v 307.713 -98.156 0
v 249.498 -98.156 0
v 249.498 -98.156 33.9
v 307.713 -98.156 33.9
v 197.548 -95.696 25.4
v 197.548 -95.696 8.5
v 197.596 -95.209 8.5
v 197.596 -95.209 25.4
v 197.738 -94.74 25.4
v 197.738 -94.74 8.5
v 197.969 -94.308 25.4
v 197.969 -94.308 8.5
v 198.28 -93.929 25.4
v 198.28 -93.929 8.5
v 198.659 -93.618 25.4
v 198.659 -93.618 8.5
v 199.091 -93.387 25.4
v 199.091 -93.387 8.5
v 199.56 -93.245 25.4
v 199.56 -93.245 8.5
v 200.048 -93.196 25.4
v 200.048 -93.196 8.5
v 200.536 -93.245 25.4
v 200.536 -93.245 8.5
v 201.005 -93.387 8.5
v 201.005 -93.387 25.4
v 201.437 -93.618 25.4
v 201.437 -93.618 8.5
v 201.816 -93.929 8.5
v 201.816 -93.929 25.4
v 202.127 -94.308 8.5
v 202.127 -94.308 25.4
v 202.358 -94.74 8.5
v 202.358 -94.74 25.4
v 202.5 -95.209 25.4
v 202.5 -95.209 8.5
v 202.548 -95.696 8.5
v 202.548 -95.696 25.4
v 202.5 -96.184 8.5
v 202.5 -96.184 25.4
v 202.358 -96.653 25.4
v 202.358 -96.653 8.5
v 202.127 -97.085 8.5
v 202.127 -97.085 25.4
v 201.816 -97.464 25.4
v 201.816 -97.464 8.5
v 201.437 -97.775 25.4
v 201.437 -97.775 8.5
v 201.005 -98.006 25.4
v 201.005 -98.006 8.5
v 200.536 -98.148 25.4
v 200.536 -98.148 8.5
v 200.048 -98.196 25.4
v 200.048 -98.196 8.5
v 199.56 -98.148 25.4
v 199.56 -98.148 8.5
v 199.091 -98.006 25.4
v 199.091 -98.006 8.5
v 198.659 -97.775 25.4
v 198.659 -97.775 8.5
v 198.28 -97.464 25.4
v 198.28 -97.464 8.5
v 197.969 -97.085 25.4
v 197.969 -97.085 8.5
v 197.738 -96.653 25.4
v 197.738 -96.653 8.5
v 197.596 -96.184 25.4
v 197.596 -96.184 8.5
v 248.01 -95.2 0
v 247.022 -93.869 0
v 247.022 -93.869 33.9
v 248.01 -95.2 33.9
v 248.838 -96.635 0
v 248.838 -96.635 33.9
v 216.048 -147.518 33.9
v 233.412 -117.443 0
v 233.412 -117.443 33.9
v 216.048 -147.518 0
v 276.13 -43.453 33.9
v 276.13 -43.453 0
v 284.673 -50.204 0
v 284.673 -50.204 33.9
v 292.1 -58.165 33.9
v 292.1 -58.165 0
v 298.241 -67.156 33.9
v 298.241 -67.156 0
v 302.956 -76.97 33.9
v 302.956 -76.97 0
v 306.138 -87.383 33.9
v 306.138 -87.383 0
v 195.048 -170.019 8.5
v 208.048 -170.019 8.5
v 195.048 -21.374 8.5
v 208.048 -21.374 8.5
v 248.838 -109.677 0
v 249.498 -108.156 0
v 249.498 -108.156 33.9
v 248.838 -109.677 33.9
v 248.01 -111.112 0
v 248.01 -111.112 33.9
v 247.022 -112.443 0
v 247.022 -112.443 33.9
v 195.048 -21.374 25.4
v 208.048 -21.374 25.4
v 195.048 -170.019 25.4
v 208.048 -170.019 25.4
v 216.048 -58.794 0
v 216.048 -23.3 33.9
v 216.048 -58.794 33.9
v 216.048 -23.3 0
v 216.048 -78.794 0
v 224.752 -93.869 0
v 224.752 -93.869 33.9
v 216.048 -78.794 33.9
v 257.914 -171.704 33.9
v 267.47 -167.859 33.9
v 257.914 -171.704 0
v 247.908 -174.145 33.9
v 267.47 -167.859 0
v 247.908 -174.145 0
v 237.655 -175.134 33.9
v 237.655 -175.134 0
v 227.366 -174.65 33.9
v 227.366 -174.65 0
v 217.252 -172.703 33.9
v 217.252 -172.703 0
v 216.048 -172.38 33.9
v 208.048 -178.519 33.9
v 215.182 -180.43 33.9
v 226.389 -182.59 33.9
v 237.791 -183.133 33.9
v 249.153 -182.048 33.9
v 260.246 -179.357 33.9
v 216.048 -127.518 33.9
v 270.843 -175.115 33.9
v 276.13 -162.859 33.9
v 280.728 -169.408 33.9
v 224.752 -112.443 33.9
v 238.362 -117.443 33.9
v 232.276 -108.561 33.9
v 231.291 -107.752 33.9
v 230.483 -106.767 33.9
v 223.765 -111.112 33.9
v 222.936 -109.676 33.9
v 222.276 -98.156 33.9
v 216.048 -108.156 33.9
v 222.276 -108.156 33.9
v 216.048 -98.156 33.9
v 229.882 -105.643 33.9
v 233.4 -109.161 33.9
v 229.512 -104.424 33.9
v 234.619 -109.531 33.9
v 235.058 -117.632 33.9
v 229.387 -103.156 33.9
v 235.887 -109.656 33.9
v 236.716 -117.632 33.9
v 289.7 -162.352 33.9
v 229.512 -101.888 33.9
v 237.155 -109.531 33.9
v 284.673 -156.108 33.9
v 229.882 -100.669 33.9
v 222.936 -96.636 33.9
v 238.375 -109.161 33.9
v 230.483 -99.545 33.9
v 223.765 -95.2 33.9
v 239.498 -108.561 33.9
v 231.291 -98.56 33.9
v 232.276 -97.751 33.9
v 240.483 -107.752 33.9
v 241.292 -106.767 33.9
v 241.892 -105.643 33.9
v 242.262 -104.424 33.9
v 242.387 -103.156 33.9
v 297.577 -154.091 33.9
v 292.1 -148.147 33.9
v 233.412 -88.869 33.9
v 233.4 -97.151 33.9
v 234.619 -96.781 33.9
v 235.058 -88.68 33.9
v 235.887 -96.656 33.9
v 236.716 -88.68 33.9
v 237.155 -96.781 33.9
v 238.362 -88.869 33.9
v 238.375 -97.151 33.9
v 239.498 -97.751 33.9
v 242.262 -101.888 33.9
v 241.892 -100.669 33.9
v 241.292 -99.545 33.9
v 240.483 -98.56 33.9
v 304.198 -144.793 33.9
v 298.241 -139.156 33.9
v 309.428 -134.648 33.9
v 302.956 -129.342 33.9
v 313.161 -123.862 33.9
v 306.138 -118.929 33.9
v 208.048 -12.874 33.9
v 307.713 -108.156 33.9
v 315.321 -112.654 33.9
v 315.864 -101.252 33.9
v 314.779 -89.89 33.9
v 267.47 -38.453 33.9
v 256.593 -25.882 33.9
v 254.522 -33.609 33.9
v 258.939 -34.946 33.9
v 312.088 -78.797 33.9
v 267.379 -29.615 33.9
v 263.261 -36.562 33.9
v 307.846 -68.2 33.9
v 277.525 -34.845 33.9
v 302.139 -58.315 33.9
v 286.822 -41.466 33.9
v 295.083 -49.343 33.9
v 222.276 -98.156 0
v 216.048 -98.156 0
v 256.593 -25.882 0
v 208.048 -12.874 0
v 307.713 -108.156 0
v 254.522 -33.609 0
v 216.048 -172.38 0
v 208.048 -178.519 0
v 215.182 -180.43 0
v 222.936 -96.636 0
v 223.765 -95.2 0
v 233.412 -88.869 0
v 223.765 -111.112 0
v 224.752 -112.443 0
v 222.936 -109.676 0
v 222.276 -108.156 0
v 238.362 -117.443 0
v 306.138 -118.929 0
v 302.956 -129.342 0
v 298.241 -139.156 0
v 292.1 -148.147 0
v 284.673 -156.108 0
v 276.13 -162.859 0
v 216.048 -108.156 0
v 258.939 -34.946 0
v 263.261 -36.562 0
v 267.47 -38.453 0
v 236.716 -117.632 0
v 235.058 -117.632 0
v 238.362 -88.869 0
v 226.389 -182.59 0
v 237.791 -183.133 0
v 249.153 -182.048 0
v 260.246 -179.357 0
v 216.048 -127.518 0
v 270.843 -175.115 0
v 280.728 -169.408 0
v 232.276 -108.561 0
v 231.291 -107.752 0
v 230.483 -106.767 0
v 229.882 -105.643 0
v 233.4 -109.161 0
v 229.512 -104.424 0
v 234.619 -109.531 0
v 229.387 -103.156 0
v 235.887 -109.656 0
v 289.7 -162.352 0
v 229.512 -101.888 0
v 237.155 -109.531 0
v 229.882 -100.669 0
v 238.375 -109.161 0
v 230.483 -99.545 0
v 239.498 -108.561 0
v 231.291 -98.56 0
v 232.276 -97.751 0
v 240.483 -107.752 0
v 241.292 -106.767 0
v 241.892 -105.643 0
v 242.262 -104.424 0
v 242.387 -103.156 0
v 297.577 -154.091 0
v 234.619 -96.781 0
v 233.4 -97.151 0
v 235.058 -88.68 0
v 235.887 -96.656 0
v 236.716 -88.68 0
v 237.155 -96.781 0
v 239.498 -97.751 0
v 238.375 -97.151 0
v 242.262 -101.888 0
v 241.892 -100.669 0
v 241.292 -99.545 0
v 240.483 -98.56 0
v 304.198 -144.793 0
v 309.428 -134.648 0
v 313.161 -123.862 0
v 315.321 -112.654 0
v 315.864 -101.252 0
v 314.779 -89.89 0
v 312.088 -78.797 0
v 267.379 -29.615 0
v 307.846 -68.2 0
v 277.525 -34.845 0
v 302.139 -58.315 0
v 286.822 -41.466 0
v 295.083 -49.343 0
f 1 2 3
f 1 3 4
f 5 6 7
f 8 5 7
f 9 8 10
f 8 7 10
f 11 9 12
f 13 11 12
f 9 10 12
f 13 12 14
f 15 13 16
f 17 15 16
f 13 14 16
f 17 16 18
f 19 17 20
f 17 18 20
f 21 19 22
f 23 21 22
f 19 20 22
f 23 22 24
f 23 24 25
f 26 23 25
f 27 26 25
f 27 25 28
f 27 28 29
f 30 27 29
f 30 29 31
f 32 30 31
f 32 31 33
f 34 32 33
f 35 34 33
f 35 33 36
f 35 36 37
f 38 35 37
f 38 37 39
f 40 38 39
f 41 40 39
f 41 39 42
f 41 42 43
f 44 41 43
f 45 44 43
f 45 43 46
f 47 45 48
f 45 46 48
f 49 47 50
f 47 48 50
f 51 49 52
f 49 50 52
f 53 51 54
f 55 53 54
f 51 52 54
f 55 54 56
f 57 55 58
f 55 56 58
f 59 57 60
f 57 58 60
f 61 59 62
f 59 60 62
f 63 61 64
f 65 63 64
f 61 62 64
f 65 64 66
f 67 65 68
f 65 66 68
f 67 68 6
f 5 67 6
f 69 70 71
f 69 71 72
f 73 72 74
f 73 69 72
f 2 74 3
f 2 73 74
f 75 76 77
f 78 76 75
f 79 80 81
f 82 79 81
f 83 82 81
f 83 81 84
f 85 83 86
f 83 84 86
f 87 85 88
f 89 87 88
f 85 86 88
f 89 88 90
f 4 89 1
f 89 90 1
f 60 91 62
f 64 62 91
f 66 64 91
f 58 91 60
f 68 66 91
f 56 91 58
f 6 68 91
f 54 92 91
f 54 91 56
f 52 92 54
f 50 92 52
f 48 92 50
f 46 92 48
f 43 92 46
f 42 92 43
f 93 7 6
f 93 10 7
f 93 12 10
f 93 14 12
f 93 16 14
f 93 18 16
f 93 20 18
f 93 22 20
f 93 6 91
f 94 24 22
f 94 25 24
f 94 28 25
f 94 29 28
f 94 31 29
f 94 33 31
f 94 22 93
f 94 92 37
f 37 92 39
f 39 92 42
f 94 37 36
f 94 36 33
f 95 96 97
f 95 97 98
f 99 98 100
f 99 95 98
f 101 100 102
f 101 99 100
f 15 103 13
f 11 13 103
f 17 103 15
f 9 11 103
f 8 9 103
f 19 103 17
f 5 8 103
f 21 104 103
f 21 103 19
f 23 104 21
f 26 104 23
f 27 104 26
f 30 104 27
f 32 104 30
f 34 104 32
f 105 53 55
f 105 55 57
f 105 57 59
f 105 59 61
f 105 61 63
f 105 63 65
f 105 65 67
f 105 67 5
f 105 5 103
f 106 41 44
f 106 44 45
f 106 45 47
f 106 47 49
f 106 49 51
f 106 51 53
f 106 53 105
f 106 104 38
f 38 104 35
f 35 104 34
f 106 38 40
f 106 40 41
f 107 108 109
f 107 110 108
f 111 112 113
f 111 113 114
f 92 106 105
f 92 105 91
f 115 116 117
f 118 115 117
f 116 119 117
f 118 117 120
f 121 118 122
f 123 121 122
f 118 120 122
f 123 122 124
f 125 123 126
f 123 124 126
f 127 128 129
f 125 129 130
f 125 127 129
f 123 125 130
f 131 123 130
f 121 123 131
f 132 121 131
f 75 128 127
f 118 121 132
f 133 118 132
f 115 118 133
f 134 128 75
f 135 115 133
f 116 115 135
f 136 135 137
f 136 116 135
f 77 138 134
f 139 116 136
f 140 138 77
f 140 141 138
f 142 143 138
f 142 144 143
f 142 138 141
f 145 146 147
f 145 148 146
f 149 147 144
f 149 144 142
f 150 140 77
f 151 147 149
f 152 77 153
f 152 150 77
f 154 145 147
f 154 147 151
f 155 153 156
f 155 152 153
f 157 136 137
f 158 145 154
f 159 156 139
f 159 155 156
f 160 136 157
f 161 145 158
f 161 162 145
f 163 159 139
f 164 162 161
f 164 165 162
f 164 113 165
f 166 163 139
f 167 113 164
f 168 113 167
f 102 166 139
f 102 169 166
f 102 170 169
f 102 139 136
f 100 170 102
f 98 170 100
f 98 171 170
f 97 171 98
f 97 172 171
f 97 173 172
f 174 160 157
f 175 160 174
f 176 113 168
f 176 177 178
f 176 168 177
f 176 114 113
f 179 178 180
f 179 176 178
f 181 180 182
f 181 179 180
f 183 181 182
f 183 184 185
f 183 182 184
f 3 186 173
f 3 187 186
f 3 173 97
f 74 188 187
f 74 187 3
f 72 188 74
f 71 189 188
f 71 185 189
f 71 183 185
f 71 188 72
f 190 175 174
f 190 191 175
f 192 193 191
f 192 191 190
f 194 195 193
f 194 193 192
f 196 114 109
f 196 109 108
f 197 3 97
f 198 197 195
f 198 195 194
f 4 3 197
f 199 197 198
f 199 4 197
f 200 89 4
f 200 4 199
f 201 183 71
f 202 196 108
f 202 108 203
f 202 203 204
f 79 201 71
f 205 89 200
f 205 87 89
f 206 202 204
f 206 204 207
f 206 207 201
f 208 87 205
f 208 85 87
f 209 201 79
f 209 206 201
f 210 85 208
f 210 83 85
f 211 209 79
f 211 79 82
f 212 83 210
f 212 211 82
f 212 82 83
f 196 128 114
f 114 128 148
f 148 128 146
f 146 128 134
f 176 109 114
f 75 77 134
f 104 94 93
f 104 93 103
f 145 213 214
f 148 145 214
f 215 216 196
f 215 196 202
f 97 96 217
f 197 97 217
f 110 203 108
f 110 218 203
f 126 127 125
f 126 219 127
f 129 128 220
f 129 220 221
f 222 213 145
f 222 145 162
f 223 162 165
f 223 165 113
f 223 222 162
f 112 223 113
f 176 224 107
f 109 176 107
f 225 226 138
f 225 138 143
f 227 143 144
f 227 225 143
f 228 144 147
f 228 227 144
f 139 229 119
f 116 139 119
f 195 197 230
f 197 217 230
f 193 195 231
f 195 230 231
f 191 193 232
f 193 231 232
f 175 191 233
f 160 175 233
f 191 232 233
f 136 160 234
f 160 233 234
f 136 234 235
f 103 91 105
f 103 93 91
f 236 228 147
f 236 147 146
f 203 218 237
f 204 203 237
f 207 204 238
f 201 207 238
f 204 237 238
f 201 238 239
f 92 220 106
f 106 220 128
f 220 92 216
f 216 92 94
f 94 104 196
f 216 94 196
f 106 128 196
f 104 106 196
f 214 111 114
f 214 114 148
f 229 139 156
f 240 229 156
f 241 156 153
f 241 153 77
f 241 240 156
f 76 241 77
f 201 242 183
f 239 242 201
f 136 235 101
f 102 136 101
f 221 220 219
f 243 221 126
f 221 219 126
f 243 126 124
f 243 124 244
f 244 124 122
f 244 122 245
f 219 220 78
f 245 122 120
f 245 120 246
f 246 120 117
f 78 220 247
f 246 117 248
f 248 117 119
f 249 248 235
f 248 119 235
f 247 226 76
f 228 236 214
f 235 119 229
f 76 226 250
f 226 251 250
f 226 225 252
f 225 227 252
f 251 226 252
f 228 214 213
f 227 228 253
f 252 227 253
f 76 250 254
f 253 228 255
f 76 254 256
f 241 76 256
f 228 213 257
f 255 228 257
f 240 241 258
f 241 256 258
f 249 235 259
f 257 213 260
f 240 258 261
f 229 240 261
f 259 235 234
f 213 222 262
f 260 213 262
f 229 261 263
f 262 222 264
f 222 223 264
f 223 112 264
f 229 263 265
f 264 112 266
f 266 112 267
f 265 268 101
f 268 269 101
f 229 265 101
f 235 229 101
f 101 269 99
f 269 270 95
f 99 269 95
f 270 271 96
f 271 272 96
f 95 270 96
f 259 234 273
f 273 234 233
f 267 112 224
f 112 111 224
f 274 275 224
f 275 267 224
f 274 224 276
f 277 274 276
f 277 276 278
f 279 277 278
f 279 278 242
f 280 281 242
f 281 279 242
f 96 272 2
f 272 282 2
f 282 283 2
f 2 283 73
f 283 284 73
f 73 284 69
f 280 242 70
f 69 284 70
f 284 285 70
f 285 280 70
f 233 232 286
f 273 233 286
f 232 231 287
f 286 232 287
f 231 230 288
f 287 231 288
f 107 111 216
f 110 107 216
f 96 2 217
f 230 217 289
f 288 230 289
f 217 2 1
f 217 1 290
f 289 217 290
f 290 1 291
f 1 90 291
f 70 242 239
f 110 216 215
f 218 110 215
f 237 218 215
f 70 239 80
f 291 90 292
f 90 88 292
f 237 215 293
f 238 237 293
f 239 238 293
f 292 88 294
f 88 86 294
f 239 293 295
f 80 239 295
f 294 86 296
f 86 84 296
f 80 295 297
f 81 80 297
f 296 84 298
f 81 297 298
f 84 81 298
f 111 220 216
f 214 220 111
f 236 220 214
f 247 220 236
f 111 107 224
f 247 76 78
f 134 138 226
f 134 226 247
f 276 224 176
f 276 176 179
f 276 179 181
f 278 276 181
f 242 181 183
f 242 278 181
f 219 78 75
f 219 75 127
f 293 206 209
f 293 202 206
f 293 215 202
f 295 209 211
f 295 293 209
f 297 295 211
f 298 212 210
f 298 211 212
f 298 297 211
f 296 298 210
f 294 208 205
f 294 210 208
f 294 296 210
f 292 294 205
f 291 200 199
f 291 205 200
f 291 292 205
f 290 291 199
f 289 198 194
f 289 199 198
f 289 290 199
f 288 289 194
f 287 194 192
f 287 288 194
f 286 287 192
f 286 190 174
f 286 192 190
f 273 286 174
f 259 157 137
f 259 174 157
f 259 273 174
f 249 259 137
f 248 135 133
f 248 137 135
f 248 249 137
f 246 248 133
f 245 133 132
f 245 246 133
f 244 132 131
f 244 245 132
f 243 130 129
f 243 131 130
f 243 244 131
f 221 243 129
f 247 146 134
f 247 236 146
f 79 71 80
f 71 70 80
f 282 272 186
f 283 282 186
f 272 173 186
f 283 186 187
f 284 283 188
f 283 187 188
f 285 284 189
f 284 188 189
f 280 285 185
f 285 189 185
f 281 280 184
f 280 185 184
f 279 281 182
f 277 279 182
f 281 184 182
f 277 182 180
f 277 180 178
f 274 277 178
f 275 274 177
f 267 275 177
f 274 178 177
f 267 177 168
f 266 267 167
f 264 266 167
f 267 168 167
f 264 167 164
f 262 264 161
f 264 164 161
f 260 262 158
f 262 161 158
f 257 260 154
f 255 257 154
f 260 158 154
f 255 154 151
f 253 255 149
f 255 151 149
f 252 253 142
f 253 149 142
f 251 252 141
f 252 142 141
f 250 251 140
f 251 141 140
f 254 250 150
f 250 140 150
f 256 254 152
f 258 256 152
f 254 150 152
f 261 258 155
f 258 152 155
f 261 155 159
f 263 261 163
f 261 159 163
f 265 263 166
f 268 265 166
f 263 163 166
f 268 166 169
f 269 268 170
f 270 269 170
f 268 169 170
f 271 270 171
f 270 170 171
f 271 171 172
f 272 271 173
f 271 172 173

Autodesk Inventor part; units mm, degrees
ref_plane "YZ Plane" through (0, 0, 0) normal (1, 0, 0) x (0, 1, 0)
ref_plane "XZ Plane" through (0, 0, 0) normal (0, 1, 0) x (-1, 0, 0)
ref_plane "XY Plane" through (0, 0, 0) normal (0, 0, 1) x (1, 0, 0)
sketch "Sketch1" plane through (0, 0, 0) normal (0, 0, 1) x (1, 0, 0)
  line L0 (0, 0) -> (160, 0)
  line L1 (160, 0) -> (118.589, -154.5481) construction
  line L2 (0, 0) -> (41.411, -154.5481) construction
  line L3 (41.411, -154.5481) -> (118.589, -154.5481)
  circle A0 centre (235.8871, -103.156) radius 80 construction
  line L4 (160, 0) -> (256.5926, -25.8819)
  line L5 (118.589, -154.5481) -> (215.1815, -180.43)
  arc A1 (215.1815, -180.43) -> (256.5926, -25.8819) centre (235.8871, -103.156) ccw
  circle A2 centre (-75.8871, -103.156) radius 80 construction
  line L6 (0, 0) -> (-96.5926, -25.8819)
  line L7 (41.411, -154.5481) -> (-55.1815, -180.43)
  arc A3 (-96.5926, -25.8819) -> (-55.1815, -180.43) centre (-75.8871, -103.156) ccw
  dimension "d0" = 160
  dimension "d1" = 160
  dimension "d2" = 160
  dimension "d3" = 75
  dimension "d4" = 75
  dimension "d5" = 160
  dimension "d6" = 100
  dimension "d7" = 160
  dimension "d9" = 100
extrude "Extrusion1" add sketch "Sketch1" along normal blind 33.9
sketch "Sketch2" plane through (0, 0, 33.9) normal (0, 0, 1) x (1, 0, 0)
  line L0 (-26.5, -133) -> (186.5, -133)
  line L1 (186.5, -133) -> (186.5, -20)
  line L2 (186.5, -20) -> (-26.5, -20)
  line L3 (-26.5, -20) -> (-26.5, -133)
  line L4 (160, 0) -> (0, 0) projected
  point P0 (80, -20)
  point P1 (80, 0)
  dimension "d12" = 213
  dimension "d13" = 113
  dimension "d14" = 20
extrude "Extrusion2" cut sketch "Sketch2" against normal through all
sketch "Sketch3" plane through (0, 0, 33.9) normal (0, 0, 1) x (1, 0, 0)
  line L0 (-26.5, -133) -> (-26.5, -20) construction
  line L1 (-26.5, -20) -> (186.5, -20) construction
  line L2 (186.5, -20) -> (186.5, -133) construction
  line L3 (186.5, -133) -> (-26.5, -133) construction
  line L4 (-48.0481, 1.5481) -> (-48.0481, -154.5481) construction
  line L5 (-48.0481, -154.5481) -> (208.0481, -154.5481) construction
  line L6 (208.0481, -154.5481) -> (208.0481, 1.5481) construction
  line L7 (208.0481, 1.5481) -> (-48.0481, 1.5481) construction
  line L8 (41.411, -154.5481) -> (118.589, -154.5481) construction
  line L9 (-48.0481, 1.5481) -> (-48.0481, -178.5186) construction
  line L10 (-55.1815, -180.43) -> (41.411, -154.5481) construction
  line L11 (208.0481, 1.5481) -> (208.0481, -178.5186) construction
  line L12 (118.589, -154.5481) -> (215.1815, -180.43) construction
  line L13 (-48.0481, -178.5186) -> (208.0481, -178.5186) construction
  line L14 (-48.0481, 1.5481) -> (208.0481, 1.5481) construction
  line L15 (160, 0) -> (256.5926, -25.8819) construction
  line L16 (208.2963, -12.941) -> (208.0481, -178.5186)
  line L17 (208.2963, -12.941) -> (256.5926, -25.8819)
  line L18 (208.0481, -178.5186) -> (215.1815, -180.43)
  arc A0 (215.1815, -180.43) -> (256.5926, -25.8819) centre (235.8871, -103.156) ccw
  line L19 (208.0481, 1.5481) -> (-166.9519, 1.5481)
  line L20 (-166.9519, 1.5481) -> (-166.9519, -188.4519)
  line L21 (-166.9519, -188.4519) -> (208.0481, -188.4519)
  line L22 (208.0481, -188.4519) -> (208.0481, 1.5481)
  point P0 (0, 0)
  point P1 (80, -154.5481)
  dimension "d17" = 190
  dimension "d18" = 375
extrude "Extrusion3" cut sketch "Sketch3" against normal through all contours L22 L21 L20 L19
sketch "Sketch4" plane through (0, 0, 33.9) normal (0, 0, 1) x (1, 0, 0)
  arc A0 (215.1815, -180.43) -> (256.5926, -25.8819) centre (235.8871, -103.156) ccw projected
  circle A1 centre (235.8871, -103.156) radius 6.5
  point P0 (0, 0)
  dimension "d21" = 13
extrude "Extrusion4" cut sketch "Sketch4" against normal through all
sketch "Sketch5" plane through (208.0481, -178.5186, 33.9) normal (-1, 0, 0) x (0, 0, 1)
  line L0 (-33.9, 165.6442) -> (0, 165.6442) projected
  line L1 (-33.9, 0) -> (-33.9, 165.6442) projected
  line L2 (0, 0) -> (-33.9, 0) projected
  line L3 (0, 165.6442) -> (0, 0) projected
  line L4 (-25.4, 157.1442) -> (-8.5, 157.1442)
  line L5 (-8.5, 157.1442) -> (-8.5, 8.5)
  line L6 (-8.5, 8.5) -> (-25.4, 8.5)
  line L7 (-25.4, 8.5) -> (-25.4, 157.1442)
  point P0 (-33.9, 178.5186)
  dimension "d24" = 8.5
extrude "Extrusion5" add sketch "Sketch5" along normal blind 13 contours L4 L5 L6 L7
sketch "Sketch6" plane through (208.0481, -170.0186, 8.5) normal (0, 0, -1) x (-1, 0, 0)
  circle A0 centre (8, 74.3221) radius 2.5
  line L0 (0, -8.5) -> (0, 157.1442) projected
  point P0 (208.0481, 170.0186)
  point P1 (0, 74.3221)
  dimension "d27" = 5
  dimension "d28" = 8
extrude "Extrusion6" cut sketch "Sketch6" against normal through all
sketch "Sketch7" plane through (0, 0, 0) normal (0, 0, -1) x (-1, 0, 0)
  circle A0 centre (-235.8871, -103.156) radius 6.5 projected
  line L0 (-208.0481, -178.5186) -> (-208.0481, -12.8745) projected
  line L1 (-208.0481, -12.8745) -> (-256.5926, -25.8819) projected
  arc A1 (-256.5926, -25.8819) -> (-215.1815, -180.43) centre (-235.8871, -103.156) ccw projected
  line L2 (-215.1815, -180.43) -> (-208.0481, -178.5186) projected
  line L3 (-254.522, -33.6093) -> (-216.0481, -23.3003)
  line L4 (-216.0481, -23.3003) -> (-216.0481, -172.38)
  line L5 (-216.0481, -172.38) -> (-217.2521, -172.7026)
  arc A2 (-254.522, -33.6093) -> (-217.2521, -172.7026) centre (-235.8871, -103.156) ccw
  circle A3 centre (-235.8871, -103.156) radius 14.5
  point P0 (0, 0)
  dimension "d31" = 8
  dimension "d32" = 8
extrude "Extrusion7" cut sketch "Sketch7" against normal through all contours L3 L4 L5 A2
sketch "Sketch8" plane through (0, 0, 0) normal (0, 0, -1) x (-1, 0, 0)
  circle A0 centre (-235.8871, -103.156) radius 6.5 construction
  circle A1 centre (-235.8871, -103.156) radius 14.5 construction
  line L0 (-235.8871, -103.156) -> (-159.7277, -103.156) construction
  line L1 (-222.2764, -98.156) -> (-123.6167, -98.156) construction
  line L2 (-222.2764, -108.156) -> (-123.6167, -108.156) construction
  line L3 (-233.4119, -88.8688) -> (-184.082, -3.427) construction
  line L4 (-224.7516, -93.8688) -> (-175.4217, -8.427) construction
  line L5 (-247.0225, -93.8688) -> (-296.3524, -8.427) construction
  line L6 (-238.3623, -88.8688) -> (-287.6921, -3.427) construction
  line L7 (-249.4977, -108.156) -> (-348.1575, -108.156) construction
  line L8 (-249.4977, -98.156) -> (-348.1575, -98.156) construction
  line L9 (-238.3623, -117.4431) -> (-287.6921, -202.885) construction
  line L10 (-247.0225, -112.4431) -> (-296.3524, -197.885) construction
  line L11 (-224.7516, -112.4431) -> (-175.4217, -197.885) construction
  line L12 (-233.4119, -117.4431) -> (-184.082, -202.885) construction
  line L13 (-216.0481, -23.3003) -> (-216.0481, -172.38) construction
  arc A2 (-254.522, -33.6093) -> (-217.2521, -172.7026) centre (-235.8871, -103.156) ccw construction
  line L14 (-254.522, -33.6093) -> (-216.0481, -23.3003) construction
  line L15 (-216.0481, -172.38) -> (-217.2521, -172.7026) construction
  line L16 (-222.2764, -98.156) -> (-216.0481, -98.156)
  line L17 (-222.2764, -108.156) -> (-216.0481, -108.156)
  line L18 (-224.7516, -112.4431) -> (-216.0481, -127.518)
  line L19 (-233.4119, -117.4431) -> (-216.0481, -147.518)
  line L20 (-238.3623, -117.4431) -> (-267.47, -167.8593)
  line L21 (-276.1303, -162.8593) -> (-247.0225, -112.4431)
  line L22 (-249.4977, -108.156) -> (-307.7132, -108.156)
  line L23 (-249.4977, -98.156) -> (-307.7132, -98.156)
  line L24 (-247.0225, -93.8688) -> (-276.1303, -43.4527)
  line L25 (-238.3623, -88.8688) -> (-267.47, -38.4527)
  line L26 (-233.4119, -88.8688) -> (-216.0481, -58.7939)
  line L27 (-224.7516, -93.8688) -> (-216.0481, -78.7939)
  line L28 (-216.0481, -58.7939) -> (-216.0481, -78.7939)
  line L29 (-216.0481, -98.156) -> (-216.0481, -108.156)
  line L30 (-216.0481, -127.518) -> (-216.0481, -147.518)
  arc A3 (-267.47, -38.4527) -> (-276.1303, -43.4527) centre (-235.8871, -103.156) ccw
  arc A4 (-307.7132, -98.156) -> (-307.7132, -108.156) centre (-235.8871, -103.156) ccw
  arc A5 (-276.1303, -162.8593) -> (-267.47, -167.8593) centre (-235.8871, -103.156) ccw
  arc A6 (-222.2764, -108.156) -> (-222.2764, -98.156) centre (-235.8871, -103.156) ccw
  arc A7 (-233.4119, -117.4431) -> (-224.7516, -112.4431) centre (-235.8871, -103.156) ccw
  arc A8 (-247.0225, -112.4431) -> (-238.3623, -117.4431) centre (-235.8871, -103.156) ccw
  arc A9 (-249.4977, -98.156) -> (-249.4977, -108.156) centre (-235.8871, -103.156) ccw
  arc A10 (-238.3623, -88.8688) -> (-247.0225, -93.8688) centre (-235.8871, -103.156) ccw
  arc A11 (-224.7516, -93.8688) -> (-233.4119, -88.8688) centre (-235.8871, -103.156) ccw
  point P0 (0, 0)
  dimension "d36" = 5
  dimension "d37" = 5
  dimension "d40" = 360
extrude "Extrusion8" add sketch "Sketch8" against normal blind 33.9
properties part number "Riser Base" material "ABS Plastic"
